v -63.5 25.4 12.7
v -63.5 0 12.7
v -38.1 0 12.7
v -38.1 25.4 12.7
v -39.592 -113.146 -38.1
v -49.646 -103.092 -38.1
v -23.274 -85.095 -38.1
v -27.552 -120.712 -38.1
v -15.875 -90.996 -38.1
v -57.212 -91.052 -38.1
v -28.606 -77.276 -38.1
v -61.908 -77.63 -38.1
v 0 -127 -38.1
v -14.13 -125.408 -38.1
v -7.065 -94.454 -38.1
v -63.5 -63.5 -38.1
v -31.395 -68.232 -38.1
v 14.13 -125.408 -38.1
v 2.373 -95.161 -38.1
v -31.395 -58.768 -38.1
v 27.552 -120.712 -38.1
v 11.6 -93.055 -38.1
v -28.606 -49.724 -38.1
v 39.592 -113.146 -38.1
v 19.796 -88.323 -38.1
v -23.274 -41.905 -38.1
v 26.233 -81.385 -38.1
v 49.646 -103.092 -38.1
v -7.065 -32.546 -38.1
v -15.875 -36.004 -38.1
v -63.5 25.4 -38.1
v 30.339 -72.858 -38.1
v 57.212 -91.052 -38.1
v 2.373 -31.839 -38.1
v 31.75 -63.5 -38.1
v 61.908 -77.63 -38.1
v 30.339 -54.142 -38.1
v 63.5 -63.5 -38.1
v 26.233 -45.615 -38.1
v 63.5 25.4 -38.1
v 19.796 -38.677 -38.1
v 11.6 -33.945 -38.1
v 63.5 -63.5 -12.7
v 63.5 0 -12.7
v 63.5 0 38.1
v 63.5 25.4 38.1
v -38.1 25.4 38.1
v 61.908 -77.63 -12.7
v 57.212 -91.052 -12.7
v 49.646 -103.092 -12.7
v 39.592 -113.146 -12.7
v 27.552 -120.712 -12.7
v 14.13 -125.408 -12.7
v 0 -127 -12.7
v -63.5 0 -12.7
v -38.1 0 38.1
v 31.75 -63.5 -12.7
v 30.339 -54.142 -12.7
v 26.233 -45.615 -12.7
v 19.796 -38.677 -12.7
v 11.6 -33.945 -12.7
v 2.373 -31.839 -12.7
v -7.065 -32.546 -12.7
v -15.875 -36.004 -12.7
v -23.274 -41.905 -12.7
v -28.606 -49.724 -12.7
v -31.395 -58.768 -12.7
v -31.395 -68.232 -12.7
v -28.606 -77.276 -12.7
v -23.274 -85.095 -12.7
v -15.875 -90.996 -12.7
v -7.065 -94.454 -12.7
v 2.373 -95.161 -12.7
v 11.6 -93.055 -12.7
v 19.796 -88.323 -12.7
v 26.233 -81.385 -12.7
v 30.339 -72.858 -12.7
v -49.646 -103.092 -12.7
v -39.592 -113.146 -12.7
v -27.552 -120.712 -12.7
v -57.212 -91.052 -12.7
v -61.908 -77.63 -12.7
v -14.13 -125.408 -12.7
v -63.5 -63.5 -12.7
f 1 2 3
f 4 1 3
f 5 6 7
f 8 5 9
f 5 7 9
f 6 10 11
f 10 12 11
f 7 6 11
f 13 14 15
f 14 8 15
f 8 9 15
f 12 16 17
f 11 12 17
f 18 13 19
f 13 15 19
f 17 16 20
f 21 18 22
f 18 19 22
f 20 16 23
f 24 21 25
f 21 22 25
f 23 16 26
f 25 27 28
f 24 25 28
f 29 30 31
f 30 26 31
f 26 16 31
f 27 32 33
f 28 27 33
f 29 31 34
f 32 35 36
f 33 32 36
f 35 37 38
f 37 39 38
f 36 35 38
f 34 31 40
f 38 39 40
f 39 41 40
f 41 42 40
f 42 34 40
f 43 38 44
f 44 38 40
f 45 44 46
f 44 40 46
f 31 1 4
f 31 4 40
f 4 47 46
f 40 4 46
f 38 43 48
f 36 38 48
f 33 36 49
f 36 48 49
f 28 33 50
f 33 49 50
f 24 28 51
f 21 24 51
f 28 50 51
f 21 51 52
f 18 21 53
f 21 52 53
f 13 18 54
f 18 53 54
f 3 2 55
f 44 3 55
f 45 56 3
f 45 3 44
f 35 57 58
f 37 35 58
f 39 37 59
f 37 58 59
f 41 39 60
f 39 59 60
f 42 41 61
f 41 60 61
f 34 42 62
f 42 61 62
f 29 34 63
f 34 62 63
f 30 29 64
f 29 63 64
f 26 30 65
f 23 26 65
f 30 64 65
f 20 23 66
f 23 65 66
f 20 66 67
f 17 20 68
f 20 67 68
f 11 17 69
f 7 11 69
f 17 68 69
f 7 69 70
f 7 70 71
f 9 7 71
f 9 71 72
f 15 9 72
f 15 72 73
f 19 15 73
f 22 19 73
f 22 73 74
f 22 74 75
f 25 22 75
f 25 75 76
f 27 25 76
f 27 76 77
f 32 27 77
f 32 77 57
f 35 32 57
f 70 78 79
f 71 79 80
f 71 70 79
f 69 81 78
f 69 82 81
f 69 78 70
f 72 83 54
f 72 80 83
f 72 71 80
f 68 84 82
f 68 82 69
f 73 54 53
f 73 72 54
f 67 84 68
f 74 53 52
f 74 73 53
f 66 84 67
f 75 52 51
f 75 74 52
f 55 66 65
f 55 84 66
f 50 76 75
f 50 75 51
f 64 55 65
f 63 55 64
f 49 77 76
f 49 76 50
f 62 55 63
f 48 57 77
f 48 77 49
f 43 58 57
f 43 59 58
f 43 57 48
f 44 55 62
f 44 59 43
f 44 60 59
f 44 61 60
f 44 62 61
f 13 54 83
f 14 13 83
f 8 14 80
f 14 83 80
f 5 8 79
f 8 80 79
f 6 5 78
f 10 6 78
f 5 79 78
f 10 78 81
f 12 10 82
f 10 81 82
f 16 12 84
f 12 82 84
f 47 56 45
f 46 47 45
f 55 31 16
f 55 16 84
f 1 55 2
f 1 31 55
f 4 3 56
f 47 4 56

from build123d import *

# Parameters (mm, degrees)
F0_W     = 127
F0_H     = 76.2
F1_DEPTH = 25.4
F2_W     = 127
F2_H     = 25.4
F3_DEPTH = 127
F5_DEPTH = 25.4
F6_R     = 31.75
F7_DEPTH = 25.401
F8_W     = 25.4
F8_H     = 25.4
F9_DEPTH = 25.401


with BuildPart() as f1:
    # F0 (on Front) → F1 (new body)
    with BuildSketch(Plane.XZ):
        Rectangle(F0_W, F0_H)
    extrude(amount=-F1_DEPTH)

    # F2 (on face) → F3 (join)
    with BuildSketch(Plane.XZ):
        with Locations((0, -25.4)):
            Rectangle(F2_W, F2_H)
    extrude(amount=F3_DEPTH)

    # F4 (on face) → F5 (cut)
    with BuildSketch(Plane.XY.offset(-12.7)):
        with BuildLine():
            Line((-63.5, -127), (0, -127))
            ThreePointArc((0, -127), (-44.901281, -108.401281), (-63.5, -63.5))
            Line((-63.5, -63.5), (-63.5, -127))
        make_face()
        with BuildLine():
            ThreePointArc((63.5, -63.5), (44.901281, -108.401281), (0, -127))
            Line((0, -127), (63.5, -127))
            Line((63.5, -127), (63.5, -63.5))
        make_face()
    extrude(amount=-F5_DEPTH, mode=Mode.SUBTRACT)

    # F6 (on face) → F7 (cut, through all)
    with BuildSketch(Plane.XY.offset(-12.7)):
        with Locations((0, -63.5)):
            Circle(F6_R)
    extrude(amount=-F7_DEPTH, mode=Mode.SUBTRACT)

    # F8 (on face) → F9 (cut, through all)
    with BuildSketch(Plane.XZ):
        with Locations((-50.8, 25.4)):
            Rectangle(F8_W, F8_H)
    extrude(amount=-F9_DEPTH, mode=Mode.SUBTRACT)


solid = f1.part
